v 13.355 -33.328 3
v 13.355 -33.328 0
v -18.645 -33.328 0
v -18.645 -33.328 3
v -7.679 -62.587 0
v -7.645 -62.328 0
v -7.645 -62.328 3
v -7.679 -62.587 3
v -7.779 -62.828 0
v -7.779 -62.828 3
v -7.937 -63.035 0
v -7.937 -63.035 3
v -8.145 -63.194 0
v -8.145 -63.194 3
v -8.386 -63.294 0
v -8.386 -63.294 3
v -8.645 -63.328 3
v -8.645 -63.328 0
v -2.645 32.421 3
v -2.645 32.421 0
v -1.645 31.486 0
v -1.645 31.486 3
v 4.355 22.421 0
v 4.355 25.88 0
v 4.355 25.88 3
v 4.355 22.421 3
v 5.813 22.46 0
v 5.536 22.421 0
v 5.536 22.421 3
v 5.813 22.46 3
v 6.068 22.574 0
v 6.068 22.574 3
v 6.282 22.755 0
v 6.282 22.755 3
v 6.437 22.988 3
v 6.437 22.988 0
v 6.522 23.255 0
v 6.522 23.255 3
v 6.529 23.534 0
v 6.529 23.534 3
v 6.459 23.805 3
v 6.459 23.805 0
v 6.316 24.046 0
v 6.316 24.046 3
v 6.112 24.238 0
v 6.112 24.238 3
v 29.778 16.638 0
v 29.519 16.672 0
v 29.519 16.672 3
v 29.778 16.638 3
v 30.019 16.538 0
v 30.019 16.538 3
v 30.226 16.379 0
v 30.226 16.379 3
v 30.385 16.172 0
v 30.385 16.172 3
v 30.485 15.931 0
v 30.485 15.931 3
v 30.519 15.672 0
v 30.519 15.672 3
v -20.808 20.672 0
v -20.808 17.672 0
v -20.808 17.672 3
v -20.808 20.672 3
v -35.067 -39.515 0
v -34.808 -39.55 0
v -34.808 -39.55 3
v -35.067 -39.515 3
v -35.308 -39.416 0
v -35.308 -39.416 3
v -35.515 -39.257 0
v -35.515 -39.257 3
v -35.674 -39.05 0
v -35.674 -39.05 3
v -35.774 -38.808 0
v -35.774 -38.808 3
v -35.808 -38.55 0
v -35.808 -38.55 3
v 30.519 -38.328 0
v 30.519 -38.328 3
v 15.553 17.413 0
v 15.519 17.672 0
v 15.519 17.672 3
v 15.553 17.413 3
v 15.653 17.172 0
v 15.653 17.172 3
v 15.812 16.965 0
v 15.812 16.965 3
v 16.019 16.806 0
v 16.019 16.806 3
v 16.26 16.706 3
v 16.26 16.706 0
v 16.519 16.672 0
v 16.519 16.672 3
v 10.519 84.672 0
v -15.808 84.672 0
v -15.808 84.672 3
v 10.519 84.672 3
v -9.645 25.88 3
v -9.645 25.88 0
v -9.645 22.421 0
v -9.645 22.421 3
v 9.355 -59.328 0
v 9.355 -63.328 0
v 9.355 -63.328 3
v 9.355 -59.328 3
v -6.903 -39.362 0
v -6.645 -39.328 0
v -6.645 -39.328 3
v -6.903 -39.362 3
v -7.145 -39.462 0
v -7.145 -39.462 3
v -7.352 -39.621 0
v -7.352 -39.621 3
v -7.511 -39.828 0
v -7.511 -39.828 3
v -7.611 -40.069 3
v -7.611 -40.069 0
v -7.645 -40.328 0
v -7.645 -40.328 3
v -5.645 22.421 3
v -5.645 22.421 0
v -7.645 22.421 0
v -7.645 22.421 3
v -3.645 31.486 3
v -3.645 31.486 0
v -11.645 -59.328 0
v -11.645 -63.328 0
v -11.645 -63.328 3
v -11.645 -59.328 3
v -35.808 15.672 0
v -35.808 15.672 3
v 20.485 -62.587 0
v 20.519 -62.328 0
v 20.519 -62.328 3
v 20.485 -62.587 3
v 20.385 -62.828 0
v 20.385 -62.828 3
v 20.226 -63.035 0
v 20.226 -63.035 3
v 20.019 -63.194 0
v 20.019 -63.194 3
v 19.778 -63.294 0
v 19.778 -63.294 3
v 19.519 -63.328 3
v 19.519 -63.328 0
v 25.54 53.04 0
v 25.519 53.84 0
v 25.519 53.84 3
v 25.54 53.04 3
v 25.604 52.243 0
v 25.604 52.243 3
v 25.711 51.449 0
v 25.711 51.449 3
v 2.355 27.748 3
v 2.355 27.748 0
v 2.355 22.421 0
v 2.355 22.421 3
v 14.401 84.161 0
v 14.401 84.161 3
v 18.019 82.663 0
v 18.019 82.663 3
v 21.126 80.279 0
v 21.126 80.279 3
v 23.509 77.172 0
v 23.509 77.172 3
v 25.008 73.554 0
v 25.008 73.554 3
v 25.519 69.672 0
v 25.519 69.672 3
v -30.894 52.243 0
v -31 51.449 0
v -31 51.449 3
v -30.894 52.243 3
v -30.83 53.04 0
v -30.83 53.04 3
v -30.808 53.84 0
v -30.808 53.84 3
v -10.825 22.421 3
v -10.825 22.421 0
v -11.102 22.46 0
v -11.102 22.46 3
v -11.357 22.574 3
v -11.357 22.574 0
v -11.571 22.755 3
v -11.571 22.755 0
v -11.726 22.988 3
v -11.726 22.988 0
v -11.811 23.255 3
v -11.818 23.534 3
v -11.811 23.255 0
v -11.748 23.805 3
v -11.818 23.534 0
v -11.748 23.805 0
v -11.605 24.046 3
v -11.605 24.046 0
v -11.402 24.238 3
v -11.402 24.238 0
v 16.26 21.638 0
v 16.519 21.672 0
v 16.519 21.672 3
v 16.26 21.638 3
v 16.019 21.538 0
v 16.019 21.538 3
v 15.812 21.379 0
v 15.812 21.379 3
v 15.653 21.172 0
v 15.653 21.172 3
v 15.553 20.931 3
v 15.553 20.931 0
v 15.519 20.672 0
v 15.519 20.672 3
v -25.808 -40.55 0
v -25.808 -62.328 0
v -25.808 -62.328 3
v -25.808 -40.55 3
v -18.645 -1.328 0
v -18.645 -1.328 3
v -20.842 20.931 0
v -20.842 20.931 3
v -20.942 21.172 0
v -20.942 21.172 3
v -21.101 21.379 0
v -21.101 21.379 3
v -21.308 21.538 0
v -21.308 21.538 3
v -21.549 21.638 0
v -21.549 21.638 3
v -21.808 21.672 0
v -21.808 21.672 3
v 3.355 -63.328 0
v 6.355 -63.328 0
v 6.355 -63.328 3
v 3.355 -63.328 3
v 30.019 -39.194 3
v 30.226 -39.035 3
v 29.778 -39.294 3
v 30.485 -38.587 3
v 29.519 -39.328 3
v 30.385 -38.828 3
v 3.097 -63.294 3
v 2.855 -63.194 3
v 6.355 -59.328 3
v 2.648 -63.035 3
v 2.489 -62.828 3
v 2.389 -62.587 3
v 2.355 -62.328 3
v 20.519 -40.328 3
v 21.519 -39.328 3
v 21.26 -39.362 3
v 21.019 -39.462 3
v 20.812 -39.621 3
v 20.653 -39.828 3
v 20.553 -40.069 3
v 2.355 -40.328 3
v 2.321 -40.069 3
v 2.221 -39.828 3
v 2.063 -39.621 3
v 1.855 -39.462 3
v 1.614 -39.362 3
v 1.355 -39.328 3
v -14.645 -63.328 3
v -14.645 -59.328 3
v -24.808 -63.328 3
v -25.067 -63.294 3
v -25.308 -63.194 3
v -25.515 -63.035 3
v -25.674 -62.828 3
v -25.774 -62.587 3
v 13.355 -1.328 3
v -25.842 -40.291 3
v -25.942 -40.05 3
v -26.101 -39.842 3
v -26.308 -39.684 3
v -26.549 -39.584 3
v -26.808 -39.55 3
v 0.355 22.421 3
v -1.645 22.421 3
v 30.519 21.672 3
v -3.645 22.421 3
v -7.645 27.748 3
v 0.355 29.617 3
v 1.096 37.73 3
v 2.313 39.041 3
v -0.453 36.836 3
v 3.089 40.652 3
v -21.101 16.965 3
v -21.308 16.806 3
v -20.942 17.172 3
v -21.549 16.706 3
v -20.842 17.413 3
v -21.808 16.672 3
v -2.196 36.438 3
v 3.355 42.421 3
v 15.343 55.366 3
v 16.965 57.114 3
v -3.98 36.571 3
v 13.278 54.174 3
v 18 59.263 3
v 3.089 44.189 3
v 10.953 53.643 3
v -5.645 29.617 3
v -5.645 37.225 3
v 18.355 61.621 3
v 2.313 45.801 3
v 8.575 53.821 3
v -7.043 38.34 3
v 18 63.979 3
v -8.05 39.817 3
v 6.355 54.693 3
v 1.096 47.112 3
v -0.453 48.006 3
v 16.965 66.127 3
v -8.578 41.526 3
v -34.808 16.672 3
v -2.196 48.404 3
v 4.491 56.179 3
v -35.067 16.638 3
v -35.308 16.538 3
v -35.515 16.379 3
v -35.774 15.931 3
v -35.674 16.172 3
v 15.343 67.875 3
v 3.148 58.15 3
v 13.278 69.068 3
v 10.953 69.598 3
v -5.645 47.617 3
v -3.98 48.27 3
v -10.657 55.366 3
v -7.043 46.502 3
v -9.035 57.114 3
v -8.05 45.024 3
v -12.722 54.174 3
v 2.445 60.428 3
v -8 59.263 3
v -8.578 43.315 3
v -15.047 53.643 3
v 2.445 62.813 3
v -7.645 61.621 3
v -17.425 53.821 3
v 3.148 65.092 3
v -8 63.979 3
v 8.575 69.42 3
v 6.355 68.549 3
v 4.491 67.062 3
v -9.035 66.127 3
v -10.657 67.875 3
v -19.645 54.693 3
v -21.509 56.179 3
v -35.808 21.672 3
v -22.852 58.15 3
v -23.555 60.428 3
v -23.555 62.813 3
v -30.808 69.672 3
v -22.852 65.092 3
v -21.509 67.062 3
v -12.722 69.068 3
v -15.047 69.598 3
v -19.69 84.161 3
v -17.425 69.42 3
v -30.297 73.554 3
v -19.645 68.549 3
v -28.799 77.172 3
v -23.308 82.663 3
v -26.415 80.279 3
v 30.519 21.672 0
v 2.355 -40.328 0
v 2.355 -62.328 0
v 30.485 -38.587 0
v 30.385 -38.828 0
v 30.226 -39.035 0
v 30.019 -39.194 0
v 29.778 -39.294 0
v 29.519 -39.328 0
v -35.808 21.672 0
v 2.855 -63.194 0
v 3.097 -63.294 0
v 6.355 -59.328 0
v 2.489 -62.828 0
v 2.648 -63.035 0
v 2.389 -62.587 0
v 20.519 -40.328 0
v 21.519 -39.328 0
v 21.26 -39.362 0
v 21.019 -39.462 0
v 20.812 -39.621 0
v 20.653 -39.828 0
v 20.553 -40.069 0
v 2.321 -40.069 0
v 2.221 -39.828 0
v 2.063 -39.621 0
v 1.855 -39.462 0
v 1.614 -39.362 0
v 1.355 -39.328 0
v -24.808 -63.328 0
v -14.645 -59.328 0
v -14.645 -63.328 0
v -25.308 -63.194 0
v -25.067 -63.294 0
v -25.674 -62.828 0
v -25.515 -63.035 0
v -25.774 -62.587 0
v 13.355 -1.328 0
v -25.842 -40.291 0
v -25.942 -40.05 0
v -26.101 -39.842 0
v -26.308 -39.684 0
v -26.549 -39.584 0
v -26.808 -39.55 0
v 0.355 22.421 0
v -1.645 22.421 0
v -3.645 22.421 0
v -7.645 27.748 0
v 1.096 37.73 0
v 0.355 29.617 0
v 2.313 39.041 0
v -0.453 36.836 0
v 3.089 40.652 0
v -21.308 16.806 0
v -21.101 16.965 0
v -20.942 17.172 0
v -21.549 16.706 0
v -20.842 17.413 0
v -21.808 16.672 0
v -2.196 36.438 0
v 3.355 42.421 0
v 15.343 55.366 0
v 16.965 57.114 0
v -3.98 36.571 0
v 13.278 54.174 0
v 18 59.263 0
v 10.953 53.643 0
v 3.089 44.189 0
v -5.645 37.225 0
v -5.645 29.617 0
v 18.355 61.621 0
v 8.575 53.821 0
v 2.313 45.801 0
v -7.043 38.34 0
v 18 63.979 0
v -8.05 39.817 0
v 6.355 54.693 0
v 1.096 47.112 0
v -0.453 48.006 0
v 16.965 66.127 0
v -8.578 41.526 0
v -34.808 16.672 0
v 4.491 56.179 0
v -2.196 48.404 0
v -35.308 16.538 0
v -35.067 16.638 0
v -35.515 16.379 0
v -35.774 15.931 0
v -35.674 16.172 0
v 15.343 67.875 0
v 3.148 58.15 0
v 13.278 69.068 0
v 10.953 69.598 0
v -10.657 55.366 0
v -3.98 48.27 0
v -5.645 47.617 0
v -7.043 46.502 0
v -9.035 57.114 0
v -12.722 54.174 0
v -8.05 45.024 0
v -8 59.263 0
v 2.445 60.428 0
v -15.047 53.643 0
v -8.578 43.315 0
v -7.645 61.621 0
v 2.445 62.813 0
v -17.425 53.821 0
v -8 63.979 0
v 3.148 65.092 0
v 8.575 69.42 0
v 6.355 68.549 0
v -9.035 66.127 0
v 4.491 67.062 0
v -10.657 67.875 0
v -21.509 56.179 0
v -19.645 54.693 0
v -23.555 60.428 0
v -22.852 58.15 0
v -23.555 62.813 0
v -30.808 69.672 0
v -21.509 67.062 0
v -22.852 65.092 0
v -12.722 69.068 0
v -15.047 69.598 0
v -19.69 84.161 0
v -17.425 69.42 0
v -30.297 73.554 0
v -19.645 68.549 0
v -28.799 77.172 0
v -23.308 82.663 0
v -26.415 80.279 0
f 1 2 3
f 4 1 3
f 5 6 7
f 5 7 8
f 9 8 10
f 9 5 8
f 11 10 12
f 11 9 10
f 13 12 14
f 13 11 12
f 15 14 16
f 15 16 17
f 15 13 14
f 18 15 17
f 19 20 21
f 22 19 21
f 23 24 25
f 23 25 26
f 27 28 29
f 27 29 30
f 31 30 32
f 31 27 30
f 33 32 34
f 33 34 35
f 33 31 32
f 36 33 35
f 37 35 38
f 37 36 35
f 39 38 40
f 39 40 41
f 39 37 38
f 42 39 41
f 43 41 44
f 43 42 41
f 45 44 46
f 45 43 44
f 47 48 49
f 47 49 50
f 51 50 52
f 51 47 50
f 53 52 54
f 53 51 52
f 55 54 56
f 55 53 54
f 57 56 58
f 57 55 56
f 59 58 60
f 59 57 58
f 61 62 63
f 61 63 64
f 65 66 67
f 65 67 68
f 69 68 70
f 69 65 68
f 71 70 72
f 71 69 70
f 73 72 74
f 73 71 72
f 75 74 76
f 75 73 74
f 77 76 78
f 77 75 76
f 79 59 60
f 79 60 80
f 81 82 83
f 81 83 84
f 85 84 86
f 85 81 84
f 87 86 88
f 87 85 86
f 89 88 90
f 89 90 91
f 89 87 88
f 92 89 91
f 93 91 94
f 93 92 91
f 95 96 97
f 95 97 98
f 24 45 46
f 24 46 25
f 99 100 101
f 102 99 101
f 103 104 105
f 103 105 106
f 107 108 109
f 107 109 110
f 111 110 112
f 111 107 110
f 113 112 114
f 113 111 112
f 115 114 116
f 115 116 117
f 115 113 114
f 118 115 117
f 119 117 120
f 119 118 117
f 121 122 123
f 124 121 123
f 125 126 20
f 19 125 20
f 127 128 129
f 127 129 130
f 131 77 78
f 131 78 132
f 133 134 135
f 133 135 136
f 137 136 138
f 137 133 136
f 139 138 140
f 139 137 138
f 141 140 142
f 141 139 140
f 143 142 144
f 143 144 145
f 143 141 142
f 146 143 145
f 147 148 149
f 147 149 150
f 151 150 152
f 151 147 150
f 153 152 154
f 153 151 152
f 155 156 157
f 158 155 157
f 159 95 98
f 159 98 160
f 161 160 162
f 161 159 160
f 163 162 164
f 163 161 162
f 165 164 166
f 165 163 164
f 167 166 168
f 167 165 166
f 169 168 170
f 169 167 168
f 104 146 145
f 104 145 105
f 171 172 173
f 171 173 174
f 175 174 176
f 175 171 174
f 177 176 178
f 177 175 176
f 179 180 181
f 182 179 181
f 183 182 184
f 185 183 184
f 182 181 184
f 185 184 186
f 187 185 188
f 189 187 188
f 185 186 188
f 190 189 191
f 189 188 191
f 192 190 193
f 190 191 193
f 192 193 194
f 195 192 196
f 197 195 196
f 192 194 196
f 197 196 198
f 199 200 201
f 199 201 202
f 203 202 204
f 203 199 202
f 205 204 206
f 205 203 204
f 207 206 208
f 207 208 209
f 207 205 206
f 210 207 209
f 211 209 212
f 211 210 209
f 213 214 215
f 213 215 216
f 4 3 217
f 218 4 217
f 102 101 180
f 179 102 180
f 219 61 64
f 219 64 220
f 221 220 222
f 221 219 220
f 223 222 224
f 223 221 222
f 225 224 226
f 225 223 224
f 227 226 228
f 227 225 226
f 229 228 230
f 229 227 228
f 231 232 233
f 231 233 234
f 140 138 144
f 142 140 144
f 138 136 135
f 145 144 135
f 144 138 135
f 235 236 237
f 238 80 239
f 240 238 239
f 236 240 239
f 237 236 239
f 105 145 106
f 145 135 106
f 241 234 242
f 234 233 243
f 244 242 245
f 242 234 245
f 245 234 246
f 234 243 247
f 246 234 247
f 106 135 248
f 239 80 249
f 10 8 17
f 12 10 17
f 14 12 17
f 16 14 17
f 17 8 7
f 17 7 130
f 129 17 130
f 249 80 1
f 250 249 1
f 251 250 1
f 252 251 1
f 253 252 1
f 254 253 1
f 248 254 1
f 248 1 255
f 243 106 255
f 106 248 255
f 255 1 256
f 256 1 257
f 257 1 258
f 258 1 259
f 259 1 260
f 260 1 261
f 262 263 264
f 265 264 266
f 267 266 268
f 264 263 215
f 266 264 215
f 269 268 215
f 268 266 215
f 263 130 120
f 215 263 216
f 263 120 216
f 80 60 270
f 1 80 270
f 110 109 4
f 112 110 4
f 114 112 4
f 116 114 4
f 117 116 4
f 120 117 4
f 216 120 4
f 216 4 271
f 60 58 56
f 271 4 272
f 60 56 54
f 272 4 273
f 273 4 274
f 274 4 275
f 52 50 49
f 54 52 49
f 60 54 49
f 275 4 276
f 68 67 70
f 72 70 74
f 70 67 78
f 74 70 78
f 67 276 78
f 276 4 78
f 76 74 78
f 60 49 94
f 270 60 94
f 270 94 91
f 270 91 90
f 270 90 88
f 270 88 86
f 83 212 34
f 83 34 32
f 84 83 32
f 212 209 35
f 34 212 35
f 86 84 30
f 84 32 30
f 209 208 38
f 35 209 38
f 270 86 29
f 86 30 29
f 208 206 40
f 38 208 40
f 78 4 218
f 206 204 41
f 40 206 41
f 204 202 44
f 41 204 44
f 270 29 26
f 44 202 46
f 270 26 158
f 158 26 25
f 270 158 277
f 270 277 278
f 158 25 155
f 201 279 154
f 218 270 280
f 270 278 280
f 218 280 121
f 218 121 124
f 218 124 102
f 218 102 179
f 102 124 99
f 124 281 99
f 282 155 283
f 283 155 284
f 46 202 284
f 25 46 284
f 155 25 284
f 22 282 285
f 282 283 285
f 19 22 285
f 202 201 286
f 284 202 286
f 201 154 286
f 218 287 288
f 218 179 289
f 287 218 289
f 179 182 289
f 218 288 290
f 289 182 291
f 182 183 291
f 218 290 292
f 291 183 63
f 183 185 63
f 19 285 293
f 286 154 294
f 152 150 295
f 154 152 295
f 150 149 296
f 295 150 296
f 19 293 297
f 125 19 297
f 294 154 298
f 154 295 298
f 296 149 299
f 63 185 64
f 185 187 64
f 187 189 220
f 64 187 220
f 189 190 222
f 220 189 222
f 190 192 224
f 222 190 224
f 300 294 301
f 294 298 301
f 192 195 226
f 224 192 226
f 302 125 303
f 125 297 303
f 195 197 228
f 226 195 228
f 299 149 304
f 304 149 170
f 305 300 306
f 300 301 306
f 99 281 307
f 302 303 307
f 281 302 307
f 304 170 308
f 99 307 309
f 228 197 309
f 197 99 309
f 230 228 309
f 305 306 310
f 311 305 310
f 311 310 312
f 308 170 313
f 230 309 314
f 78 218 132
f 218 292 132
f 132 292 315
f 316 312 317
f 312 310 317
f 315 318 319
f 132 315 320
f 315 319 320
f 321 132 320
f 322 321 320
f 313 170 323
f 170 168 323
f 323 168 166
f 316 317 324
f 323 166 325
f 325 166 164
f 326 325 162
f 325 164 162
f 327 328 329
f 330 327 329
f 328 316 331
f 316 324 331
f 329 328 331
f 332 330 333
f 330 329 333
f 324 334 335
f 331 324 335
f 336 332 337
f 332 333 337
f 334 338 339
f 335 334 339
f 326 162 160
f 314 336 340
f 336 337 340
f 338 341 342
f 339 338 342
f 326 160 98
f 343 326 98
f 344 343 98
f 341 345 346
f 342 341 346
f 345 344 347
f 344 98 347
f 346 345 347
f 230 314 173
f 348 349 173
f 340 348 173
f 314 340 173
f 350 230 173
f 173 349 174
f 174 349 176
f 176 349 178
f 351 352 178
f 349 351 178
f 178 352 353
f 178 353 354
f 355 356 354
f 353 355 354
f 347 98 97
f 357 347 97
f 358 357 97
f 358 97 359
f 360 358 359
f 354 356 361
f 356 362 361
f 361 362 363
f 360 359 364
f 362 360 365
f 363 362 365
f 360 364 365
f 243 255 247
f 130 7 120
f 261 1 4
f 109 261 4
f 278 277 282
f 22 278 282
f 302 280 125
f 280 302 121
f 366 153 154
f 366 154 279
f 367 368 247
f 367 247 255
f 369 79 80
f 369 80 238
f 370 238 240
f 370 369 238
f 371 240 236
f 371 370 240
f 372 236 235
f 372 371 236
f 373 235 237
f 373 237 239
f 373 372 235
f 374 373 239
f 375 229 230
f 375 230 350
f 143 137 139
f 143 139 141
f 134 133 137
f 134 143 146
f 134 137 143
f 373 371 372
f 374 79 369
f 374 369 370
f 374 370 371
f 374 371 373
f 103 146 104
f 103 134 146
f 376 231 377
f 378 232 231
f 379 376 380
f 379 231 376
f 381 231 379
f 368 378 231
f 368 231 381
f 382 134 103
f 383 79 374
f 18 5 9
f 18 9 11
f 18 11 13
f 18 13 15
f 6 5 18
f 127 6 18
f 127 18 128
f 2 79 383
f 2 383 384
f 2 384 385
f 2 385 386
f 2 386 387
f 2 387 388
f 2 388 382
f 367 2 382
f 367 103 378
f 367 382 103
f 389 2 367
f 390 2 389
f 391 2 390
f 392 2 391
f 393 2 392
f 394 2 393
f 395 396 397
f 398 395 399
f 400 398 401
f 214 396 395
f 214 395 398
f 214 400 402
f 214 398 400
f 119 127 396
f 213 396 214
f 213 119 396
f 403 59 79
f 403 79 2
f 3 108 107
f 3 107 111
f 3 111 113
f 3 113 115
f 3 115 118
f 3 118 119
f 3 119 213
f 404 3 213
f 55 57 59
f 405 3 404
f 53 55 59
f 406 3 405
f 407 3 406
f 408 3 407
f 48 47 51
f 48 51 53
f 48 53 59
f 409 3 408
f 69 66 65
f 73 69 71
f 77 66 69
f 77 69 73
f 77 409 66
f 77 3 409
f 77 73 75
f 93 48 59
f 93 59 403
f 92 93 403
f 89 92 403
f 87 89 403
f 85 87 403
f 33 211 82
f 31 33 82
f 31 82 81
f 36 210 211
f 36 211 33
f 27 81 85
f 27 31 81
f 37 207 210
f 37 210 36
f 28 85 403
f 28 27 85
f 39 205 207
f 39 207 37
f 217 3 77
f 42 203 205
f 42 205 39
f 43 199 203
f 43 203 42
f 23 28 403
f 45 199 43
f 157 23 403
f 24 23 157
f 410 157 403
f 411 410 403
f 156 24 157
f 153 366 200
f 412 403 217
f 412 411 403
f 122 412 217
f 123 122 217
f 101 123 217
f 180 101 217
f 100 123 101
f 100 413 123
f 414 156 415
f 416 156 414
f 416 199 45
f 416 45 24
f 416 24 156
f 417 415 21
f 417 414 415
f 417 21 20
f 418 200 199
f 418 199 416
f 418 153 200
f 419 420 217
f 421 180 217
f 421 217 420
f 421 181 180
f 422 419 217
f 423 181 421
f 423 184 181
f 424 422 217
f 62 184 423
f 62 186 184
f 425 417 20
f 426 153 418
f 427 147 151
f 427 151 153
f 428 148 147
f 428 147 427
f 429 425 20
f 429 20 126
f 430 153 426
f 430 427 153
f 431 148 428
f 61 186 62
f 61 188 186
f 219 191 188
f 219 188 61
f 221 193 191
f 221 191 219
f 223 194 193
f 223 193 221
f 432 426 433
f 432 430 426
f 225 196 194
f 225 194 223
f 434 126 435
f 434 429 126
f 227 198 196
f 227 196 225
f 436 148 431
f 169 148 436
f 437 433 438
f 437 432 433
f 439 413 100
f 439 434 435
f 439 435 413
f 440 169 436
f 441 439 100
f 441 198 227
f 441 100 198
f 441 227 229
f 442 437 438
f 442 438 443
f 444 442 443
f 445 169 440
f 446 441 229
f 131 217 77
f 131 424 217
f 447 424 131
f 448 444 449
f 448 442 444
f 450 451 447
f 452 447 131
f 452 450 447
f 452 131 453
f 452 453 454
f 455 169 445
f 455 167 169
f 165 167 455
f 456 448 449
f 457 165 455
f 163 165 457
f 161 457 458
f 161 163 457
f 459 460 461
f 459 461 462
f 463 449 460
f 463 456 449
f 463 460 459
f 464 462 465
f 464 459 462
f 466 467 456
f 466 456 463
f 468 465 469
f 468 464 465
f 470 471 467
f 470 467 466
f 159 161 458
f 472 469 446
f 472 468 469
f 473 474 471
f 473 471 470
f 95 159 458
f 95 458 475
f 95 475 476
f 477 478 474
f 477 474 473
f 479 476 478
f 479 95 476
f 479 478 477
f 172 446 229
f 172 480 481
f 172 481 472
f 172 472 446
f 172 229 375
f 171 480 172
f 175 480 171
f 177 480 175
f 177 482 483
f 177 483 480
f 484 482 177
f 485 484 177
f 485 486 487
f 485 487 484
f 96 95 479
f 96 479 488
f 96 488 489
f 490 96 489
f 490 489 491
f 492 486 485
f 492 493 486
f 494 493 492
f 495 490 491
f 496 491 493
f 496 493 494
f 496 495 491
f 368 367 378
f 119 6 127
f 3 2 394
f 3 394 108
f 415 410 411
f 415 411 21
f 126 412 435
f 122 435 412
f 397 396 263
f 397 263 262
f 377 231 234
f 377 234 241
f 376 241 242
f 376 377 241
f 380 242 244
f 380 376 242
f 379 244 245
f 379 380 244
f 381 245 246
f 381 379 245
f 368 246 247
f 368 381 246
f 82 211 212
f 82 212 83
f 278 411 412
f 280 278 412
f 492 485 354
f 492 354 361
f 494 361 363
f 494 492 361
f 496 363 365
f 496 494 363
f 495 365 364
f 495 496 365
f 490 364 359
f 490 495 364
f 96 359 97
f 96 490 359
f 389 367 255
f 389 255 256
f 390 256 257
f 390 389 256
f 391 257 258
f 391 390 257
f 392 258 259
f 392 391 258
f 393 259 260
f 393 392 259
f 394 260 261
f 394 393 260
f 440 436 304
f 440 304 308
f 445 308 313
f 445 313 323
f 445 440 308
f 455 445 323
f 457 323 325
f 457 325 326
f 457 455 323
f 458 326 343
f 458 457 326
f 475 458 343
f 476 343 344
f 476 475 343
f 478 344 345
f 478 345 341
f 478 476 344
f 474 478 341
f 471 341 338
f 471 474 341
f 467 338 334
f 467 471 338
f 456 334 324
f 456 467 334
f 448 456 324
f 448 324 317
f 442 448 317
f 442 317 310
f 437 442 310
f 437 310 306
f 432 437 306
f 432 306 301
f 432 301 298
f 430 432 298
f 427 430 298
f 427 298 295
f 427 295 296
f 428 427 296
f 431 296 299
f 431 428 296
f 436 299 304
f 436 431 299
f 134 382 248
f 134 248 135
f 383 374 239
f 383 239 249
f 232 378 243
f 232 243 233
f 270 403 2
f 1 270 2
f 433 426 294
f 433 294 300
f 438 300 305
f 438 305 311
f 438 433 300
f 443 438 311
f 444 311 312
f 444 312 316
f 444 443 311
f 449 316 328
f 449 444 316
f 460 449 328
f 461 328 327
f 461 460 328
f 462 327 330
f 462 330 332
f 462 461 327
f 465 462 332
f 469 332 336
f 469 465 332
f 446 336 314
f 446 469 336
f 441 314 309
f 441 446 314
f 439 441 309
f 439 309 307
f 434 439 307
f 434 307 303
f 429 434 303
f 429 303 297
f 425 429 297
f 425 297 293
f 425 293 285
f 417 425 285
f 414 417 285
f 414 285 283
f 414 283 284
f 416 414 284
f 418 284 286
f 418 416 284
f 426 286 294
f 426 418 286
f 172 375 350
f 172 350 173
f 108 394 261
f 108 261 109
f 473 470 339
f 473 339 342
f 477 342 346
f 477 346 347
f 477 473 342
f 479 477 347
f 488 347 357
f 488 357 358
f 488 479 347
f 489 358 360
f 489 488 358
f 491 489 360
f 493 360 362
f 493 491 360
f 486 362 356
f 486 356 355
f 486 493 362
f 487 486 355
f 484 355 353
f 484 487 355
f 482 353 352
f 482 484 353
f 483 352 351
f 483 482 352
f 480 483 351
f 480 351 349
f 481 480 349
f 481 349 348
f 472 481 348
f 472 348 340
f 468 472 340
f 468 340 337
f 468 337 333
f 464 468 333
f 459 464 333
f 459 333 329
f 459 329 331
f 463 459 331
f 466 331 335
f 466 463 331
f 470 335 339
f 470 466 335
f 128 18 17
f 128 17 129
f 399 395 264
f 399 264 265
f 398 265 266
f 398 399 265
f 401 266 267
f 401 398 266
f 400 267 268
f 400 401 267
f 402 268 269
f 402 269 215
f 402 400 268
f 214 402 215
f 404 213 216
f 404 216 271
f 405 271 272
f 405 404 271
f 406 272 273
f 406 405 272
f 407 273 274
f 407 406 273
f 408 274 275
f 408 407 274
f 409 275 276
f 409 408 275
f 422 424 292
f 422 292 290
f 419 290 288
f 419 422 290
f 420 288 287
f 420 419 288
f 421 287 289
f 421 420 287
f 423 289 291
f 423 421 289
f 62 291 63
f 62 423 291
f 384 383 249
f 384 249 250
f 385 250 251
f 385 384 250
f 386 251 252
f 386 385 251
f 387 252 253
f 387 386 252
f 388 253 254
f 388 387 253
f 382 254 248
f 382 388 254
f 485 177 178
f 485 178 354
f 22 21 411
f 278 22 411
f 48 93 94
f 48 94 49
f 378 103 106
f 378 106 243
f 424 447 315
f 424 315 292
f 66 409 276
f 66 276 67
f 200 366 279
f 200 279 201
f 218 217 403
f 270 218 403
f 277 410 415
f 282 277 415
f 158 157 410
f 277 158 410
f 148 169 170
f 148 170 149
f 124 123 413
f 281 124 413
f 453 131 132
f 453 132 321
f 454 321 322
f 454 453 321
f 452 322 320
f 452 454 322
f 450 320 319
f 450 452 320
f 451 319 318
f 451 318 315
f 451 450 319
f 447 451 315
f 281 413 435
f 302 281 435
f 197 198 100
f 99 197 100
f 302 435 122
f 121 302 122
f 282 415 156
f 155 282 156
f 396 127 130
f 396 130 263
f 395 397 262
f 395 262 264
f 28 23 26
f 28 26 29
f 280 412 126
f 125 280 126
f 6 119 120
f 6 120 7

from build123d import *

# Parameters (mm, degrees)
MODEL_R                 = 8
MODEL_R_2               = 6
SALIENTE_EXTRUIR1_DEPTH = 3


with BuildPart() as part:
    # Model → Saliente-Extruir1 (new body)
    with BuildSketch(Plane.XY):
        with BuildLine():
            Line((30.519021416, 15.672169472), (30.519021416, -38.327830528))
            ThreePointArc((30.519021416, -38.327830528), (30.226128197, -39.034937309), (29.519021416, -39.327830528))
            Line((29.519021416, -39.327830528), (21.519021416, -39.327830528))
            ThreePointArc((21.519021416, -39.327830528), (20.811914634, -39.620723747), (20.519021416, -40.327830528))
            Line((20.519021416, -40.327830528), (20.519021416, -62.327830528))
            ThreePointArc((20.519021416, -62.327830528), (20.226128197, -63.034937309), (19.519021416, -63.327830528))
            Line((19.519021416, -63.327830528), (9.355410048, -63.327830528))
            Line((9.355410048, -63.327830528), (9.355410048, -59.327830528))
            Line((9.355410048, -59.327830528), (6.355410048, -59.327830528))
            Line((6.355410048, -59.327830528), (6.355410048, -63.327830528))
            Line((6.355410048, -63.327830528), (3.355410048, -63.327830528))
            ThreePointArc((3.355410048, -63.327830528), (2.648303267, -63.034937309), (2.355410048, -62.327830528))
            Line((2.355410048, -62.327830528), (2.355410048, -40.327830528))
            ThreePointArc((2.355410048, -40.327830528), (2.062516829, -39.620723747), (1.355410048, -39.327830528))
            Line((1.355410048, -39.327830528), (-6.644589952, -39.327830528))
            ThreePointArc((-6.644589952, -39.327830528), (-7.351696733, -39.620723747), (-7.644589952, -40.327830528))
            Line((-7.644589952, -40.327830528), (-7.644589952, -62.327830528))
            ThreePointArc((-7.644589952, -62.327830528), (-7.937483171, -63.034937309), (-8.644589952, -63.327830528))
            Line((-8.644589952, -63.327830528), (-11.644589952, -63.327830528))
            Line((-11.644589952, -63.327830528), (-11.644589952, -59.327830528))
            Line((-11.644589952, -59.327830528), (-14.644589952, -59.327830528))
            Line((-14.644589952, -59.327830528), (-14.644589952, -63.327830528))
            Line((-14.644589952, -63.327830528), (-24.80820132, -63.327830528))
            ThreePointArc((-24.80820132, -63.327830528), (-25.515308101, -63.034937309), (-25.80820132, -62.327830528))
            Line((-25.80820132, -62.327830528), (-25.80820132, -40.549556443))
            ThreePointArc((-25.80820132, -40.549556443), (-26.101094538, -39.842449662), (-26.80820132, -39.549556443))
            Line((-26.80820132, -39.549556443), (-34.80820132, -39.549556443))
            ThreePointArc((-34.80820132, -39.549556443), (-35.515308101, -39.256663224), (-35.80820132, -38.549556443))
            Line((-35.80820132, -38.549556443), (-35.80820132, 8.978477483))
            Line((-35.80820132, 8.978477483), (-35.80820132, 15.672169472))
            ThreePointArc((-35.80820132, 15.672169472), (-35.515308101, 16.379276253), (-34.80820132, 16.672169472))
            Line((-34.80820132, 16.672169472), (-21.80820132, 16.672169472))
            ThreePointArc((-21.80820132, 16.672169472), (-21.101094538, 16.965062691), (-20.80820132, 17.672169472))
            Line((-20.80820132, 17.672169472), (-20.80820132, 20.672169472))
            ThreePointArc((-20.80820132, 20.672169472), (-21.101094538, 21.379276253), (-21.80820132, 21.672169472))
            Line((-21.80820132, 21.672169472), (-35.80820132, 21.672169472))
            Line((-35.80820132, 21.672169472), (-31.000008461, 51.449360761))
            ThreePointArc((-31.000008461, 51.449360761), (-30.856229997, 52.641077199), (-30.80820132, 53.840474364))
            Line((-30.80820132, 53.840474364), (-30.80820132, 69.672169472))
            ThreePointArc((-30.80820132, 69.672169472), (-26.414803037, 80.27877119), (-15.80820132, 84.672169472))
            Line((-15.80820132, 84.672169472), (10.519021416, 84.672169472))
            ThreePointArc((10.519021416, 84.672169472), (21.125623133, 80.27877119), (25.519021416, 69.672169472))
            Line((25.519021416, 69.672169472), (25.519021416, 62.471272593))
            Line((25.519021416, 62.471272593), (25.519021416, 53.840474364))
            ThreePointArc((25.519021416, 53.840474364), (25.567050093, 52.641077199), (25.710828557, 51.449360761))
            Line((25.710828557, 51.449360761), (30.519021416, 21.672169472))
            Line((30.519021416, 21.672169472), (16.519021416, 21.672169472))
            ThreePointArc((16.519021416, 21.672169472), (15.811914634, 21.379276253), (15.519021416, 20.672169472))
            Line((15.519021416, 20.672169472), (15.519021416, 17.672169472))
            ThreePointArc((15.519021416, 17.672169472), (15.811914634, 16.965062691), (16.519021416, 16.672169472))
            Line((16.519021416, 16.672169472), (29.519021416, 16.672169472))
            ThreePointArc((29.519021416, 16.672169472), (30.226128197, 16.379276253), (30.519021416, 15.672169472))
        make_face()
        with Locations((-15.644589952, 61.620749462)):
            Circle(MODEL_R, mode=Mode.SUBTRACT)
        with Locations((10.355410048, 61.620749462)):
            Circle(MODEL_R, mode=Mode.SUBTRACT)
        with Locations((-2.644589952, 42.420749462)):
            Circle(MODEL_R_2, mode=Mode.SUBTRACT)
        with BuildLine():
            Line((4.355410048, 22.420749462), (5.535659362, 22.420749462))
            ThreePointArc((5.535659362, 22.420749462), (6.488784367, 23.118172652), (6.112446409, 24.23764401))
            Line((6.112446409, 24.23764401), (4.355410048, 25.879525262))
            Line((4.355410048, 25.879525262), (4.355410048, 22.420749462))
        make_face(mode=Mode.SUBTRACT)
        Polygon((2.355410048, 22.420749462), (0.355410048, 22.420749462), (0.355410048, 29.617367662), (2.355410048, 27.748446462), align=None, mode=Mode.SUBTRACT)
        Polygon((-3.644589952, 31.486288862), (-2.644589952, 32.420749462), (-1.644589952, 31.486288862), (-1.644589952, 22.420749462), (-3.644589952, 22.420749462), align=None, mode=Mode.SUBTRACT)
        Polygon((-5.644589952, 22.420749462), (-7.644589952, 22.420749462), (-7.644589952, 27.748446462), (-5.644589952, 29.617367662), align=None, mode=Mode.SUBTRACT)
        with BuildLine():
            Line((-9.644589952, 22.420749462), (-10.824839266, 22.420749462))
            ThreePointArc((-10.824839266, 22.420749462), (-11.777964271, 23.118172652), (-11.401626313, 24.23764401))
            Line((-11.401626313, 24.23764401), (-9.644589952, 25.879525262))
            Line((-9.644589952, 25.879525262), (-9.644589952, 22.420749462))
        make_face(mode=Mode.SUBTRACT)
        Polygon((13.355410048, -33.327830528), (-18.644589952, -33.327830528), (-18.644589952, -1.327830528), (-2.144589952, -1.327830528), (13.355410048, -1.327830528), align=None, mode=Mode.SUBTRACT)
    extrude(amount=SALIENTE_EXTRUIR1_DEPTH)


solid = part.part
